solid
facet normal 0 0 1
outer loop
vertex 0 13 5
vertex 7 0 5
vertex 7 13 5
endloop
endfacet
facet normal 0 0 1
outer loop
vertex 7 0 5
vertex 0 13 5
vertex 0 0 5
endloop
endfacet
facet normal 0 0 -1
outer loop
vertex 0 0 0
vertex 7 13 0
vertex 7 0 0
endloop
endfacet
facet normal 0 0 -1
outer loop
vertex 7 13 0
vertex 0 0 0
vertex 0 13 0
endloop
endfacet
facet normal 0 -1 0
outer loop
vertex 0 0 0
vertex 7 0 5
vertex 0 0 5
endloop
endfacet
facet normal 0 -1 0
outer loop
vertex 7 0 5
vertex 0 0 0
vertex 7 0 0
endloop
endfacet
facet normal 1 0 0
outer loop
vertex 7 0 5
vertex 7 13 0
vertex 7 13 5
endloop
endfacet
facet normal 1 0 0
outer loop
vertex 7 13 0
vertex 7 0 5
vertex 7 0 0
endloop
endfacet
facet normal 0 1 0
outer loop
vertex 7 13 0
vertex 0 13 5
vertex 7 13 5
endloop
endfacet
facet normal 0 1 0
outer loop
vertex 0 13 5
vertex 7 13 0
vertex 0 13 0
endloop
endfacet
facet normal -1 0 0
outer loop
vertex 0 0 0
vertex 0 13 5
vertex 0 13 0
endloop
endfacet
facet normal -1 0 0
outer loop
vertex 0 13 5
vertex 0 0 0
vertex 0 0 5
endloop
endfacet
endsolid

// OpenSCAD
// Generated by SolidPython 1.0.1 on 2020-07-29 00:46:55


cube(size = [7, 13, 5]);
/***********************************************
*********      SolidPython code:      **********
************************************************
 
# import packages: SolidPython
from solid import *
from solid.utils import *
from itertools import chain, combinations, permutations


class Resize:

    def __init__(self, scad_file):
        self.scad_file = scad_file
        #self.scad_file = import_scad(scad_file)
        # cone/cylinder param:
        self.r1 = 0
        self.r2 = 0
        self.h = 0
        # rectangular prism param:
        self.w = 0
        self.l = 0
        # ellipse param:
        self.r = 0

    # import OpenScad code (file name corresponds to shape)


    # classify shape + parameters
    def assign(self, param1, param2, param3):
        if self.scad_file == 'cone.scad':
            self.r1 = param1
            self.r2 = param2
            self.h = param3
        elif self.scad_file == 'cylinder.scad':
            self.r1 = param1
            self.r2 = param2
            self.h = param3
        elif self.scad_file == 'rectangularPrism.scad':
            self.h = param1
            self.l = param2
            self.w = param3
        else:
            self.r = param1
            self.h = param2

    # resize parameters
    def iterate(self):
        x = range(3, 20, 2)
        i = 1
        if self.scad_file == 'cone.scad':
            tempList = list(permutations(x, 2))
            for temp in tempList:
                param1 = temp[0]
                param2 = temp[1]
                filepath = 'produced_scad_files/' + 'cone' + str(param1) + '_' + str(param2) + '_' + '.scad'
                scad_render_to_file(cylinder(h=param1, r1=param2, r2=0), filepath)

        elif self.scad_file == 'cylinder.scad':
            tempList = list(permutations(x, 3))
            for temp in tempList:
                param1 = temp[0]
                param2 = temp[1]
                filepath = 'produced_scad_files/' + 'cylinder' + str(param1) + '_' + str(param2) + '_' + '.scad'
                scad_render_to_file(cylinder(h=param1, r1=param2, r2=param2), filepath)

        elif self.scad_file == 'rectangularPrism.scad':
            tempList = list(permutations(x, 3))
            for temp in tempList:
                param1 = temp[0]
                param2 = temp[1]
                param3 = temp[2]
                filepath = 'produced_scad_files/' + 'rectangularPrism' + str(param1) + '_' + str(param2) + '_' + str(
                    param3) + '.scad'
                scad_render_to_file(cube(size=(param1, param2, param3)), filepath)

        elif self.scad_file == 'ellipse.scad':
            tempList = list(permutations(x, 4))
            for temp in tempList:
                param1 = temp[0]
                param2 = temp[1]
                param3 = temp[2]
                param4 = temp[3]
                filepath = 'produced_scad_files/' + 'ellipse' + str(param1) + '_' + str(param2) + '_' + str(param3) + '_' + str(param4) + '.scad'
                scad_render_to_file(scale([param1, param2, param3])(sphere(r=param4)), filepath)

    def render_to_scadfile(self):
        scad_render_to_file(scad, 'example.scad') 
 
************************************************/
